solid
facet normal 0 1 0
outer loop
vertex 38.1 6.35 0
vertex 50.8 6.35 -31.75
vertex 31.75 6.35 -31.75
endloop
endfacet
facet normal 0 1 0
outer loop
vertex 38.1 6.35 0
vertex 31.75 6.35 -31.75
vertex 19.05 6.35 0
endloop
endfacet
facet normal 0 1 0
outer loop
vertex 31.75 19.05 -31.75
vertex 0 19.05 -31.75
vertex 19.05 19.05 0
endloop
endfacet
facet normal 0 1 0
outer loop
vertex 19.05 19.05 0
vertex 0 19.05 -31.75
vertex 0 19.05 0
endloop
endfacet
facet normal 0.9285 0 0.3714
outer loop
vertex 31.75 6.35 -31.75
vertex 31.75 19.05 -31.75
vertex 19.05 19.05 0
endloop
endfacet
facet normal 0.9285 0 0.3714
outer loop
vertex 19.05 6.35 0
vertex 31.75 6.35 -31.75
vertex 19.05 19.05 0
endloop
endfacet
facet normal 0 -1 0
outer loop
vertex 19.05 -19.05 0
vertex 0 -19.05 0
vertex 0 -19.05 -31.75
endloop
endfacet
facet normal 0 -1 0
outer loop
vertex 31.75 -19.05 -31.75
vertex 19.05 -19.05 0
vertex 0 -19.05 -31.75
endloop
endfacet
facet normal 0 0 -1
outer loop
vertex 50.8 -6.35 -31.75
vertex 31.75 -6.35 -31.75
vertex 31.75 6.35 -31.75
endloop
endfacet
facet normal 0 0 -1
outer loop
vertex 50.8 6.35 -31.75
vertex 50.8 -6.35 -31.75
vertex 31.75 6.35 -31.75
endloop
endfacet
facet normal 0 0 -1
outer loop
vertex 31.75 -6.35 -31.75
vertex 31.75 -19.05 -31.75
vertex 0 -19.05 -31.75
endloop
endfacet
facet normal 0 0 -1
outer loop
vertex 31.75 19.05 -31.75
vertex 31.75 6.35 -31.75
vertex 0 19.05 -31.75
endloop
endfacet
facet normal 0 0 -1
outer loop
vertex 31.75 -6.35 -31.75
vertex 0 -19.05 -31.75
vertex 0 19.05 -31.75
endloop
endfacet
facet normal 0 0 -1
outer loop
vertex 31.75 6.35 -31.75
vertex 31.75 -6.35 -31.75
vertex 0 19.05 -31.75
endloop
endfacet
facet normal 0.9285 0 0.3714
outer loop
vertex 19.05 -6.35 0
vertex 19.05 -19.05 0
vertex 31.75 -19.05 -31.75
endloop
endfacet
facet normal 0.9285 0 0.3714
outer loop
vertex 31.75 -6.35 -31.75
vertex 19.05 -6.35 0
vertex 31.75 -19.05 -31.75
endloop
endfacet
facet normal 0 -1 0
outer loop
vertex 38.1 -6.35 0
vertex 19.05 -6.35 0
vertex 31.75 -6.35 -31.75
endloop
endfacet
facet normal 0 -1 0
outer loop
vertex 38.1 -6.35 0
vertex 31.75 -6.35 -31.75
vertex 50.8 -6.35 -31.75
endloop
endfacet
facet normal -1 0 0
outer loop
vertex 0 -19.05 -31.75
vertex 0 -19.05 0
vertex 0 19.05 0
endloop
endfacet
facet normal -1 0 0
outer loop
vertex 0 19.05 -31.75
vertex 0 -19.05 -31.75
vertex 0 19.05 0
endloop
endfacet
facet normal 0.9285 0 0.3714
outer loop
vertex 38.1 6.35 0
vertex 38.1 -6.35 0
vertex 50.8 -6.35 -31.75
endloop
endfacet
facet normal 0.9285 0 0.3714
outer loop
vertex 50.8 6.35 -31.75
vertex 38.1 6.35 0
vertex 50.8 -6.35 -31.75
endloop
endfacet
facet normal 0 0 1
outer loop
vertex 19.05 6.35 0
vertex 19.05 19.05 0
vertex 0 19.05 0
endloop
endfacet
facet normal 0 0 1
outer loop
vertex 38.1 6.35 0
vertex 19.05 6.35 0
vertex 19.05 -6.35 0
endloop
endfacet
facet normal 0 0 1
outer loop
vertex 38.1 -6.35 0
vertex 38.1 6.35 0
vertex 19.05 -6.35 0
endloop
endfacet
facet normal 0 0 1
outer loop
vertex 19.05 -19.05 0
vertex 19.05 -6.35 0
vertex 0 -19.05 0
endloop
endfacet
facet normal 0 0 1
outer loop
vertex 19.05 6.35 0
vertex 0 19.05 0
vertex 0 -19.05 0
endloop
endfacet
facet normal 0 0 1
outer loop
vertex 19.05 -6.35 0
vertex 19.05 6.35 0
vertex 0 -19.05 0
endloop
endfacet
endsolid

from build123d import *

# Parameters (mm, degrees)
F1_DEPTH  = 50.8
F2_W      = 12.7
F2_H      = 31.75
F3_DEPTH  = 19.05
F5_DEPTH  = 12.7
F6_W      = 12.7
F6_H      = 31.75
F7_DEPTH  = 19.05
F9_DEPTH  = 12.7
F11_DEPTH = 25.4


with BuildPart() as f1:
    # F0 (on Right) → F1 (new body)
    with BuildSketch(Plane.YZ):
        Polygon((19.05, 0), (0, 0), (-19.05, 0), (-19.05, -31.75), (19.05, -31.75), align=None)
    extrude(amount=F1_DEPTH)

    # F2 (on face) → F3 (cut)
    with BuildSketch(Plane.YZ.offset(50.8)):
        with Locations((-12.7, -15.875)):
            Rectangle(F2_W, F2_H)
    extrude(amount=-F3_DEPTH, mode=Mode.SUBTRACT)

    # F4 (on face) → F5 (cut)
    with BuildSketch(Plane.XZ.offset(19.05)):
        Polygon((31.75, -31.75), (31.75, 0), (19.05, 0), align=None)
    extrude(amount=-F5_DEPTH, mode=Mode.SUBTRACT)

    # F6 (on face) → F7 (cut)
    with BuildSketch(Plane.YZ.offset(50.8)):
        with Locations((12.7, -15.875)):
            Rectangle(F6_W, F6_H)
    extrude(amount=-F7_DEPTH, mode=Mode.SUBTRACT)

    # F8 (on face) → F9 (cut)
    with BuildSketch(Plane(origin=(0, 19.05, 0), x_dir=(-1, 0, 0), z_dir=(0, 1, 0))):
        Polygon((-19.05, 0), (-31.75, 0), (-31.75, -31.75), align=None)
    extrude(amount=-F9_DEPTH, mode=Mode.SUBTRACT)

    # F10 (on face) → F11 (cut)
    with BuildSketch(Plane.XZ.offset(6.35)):
        Polygon((38.1, 0), (50.8, -31.75), (50.8, 0), align=None)
    extrude(amount=-F11_DEPTH, mode=Mode.SUBTRACT)


solid = f1.part
